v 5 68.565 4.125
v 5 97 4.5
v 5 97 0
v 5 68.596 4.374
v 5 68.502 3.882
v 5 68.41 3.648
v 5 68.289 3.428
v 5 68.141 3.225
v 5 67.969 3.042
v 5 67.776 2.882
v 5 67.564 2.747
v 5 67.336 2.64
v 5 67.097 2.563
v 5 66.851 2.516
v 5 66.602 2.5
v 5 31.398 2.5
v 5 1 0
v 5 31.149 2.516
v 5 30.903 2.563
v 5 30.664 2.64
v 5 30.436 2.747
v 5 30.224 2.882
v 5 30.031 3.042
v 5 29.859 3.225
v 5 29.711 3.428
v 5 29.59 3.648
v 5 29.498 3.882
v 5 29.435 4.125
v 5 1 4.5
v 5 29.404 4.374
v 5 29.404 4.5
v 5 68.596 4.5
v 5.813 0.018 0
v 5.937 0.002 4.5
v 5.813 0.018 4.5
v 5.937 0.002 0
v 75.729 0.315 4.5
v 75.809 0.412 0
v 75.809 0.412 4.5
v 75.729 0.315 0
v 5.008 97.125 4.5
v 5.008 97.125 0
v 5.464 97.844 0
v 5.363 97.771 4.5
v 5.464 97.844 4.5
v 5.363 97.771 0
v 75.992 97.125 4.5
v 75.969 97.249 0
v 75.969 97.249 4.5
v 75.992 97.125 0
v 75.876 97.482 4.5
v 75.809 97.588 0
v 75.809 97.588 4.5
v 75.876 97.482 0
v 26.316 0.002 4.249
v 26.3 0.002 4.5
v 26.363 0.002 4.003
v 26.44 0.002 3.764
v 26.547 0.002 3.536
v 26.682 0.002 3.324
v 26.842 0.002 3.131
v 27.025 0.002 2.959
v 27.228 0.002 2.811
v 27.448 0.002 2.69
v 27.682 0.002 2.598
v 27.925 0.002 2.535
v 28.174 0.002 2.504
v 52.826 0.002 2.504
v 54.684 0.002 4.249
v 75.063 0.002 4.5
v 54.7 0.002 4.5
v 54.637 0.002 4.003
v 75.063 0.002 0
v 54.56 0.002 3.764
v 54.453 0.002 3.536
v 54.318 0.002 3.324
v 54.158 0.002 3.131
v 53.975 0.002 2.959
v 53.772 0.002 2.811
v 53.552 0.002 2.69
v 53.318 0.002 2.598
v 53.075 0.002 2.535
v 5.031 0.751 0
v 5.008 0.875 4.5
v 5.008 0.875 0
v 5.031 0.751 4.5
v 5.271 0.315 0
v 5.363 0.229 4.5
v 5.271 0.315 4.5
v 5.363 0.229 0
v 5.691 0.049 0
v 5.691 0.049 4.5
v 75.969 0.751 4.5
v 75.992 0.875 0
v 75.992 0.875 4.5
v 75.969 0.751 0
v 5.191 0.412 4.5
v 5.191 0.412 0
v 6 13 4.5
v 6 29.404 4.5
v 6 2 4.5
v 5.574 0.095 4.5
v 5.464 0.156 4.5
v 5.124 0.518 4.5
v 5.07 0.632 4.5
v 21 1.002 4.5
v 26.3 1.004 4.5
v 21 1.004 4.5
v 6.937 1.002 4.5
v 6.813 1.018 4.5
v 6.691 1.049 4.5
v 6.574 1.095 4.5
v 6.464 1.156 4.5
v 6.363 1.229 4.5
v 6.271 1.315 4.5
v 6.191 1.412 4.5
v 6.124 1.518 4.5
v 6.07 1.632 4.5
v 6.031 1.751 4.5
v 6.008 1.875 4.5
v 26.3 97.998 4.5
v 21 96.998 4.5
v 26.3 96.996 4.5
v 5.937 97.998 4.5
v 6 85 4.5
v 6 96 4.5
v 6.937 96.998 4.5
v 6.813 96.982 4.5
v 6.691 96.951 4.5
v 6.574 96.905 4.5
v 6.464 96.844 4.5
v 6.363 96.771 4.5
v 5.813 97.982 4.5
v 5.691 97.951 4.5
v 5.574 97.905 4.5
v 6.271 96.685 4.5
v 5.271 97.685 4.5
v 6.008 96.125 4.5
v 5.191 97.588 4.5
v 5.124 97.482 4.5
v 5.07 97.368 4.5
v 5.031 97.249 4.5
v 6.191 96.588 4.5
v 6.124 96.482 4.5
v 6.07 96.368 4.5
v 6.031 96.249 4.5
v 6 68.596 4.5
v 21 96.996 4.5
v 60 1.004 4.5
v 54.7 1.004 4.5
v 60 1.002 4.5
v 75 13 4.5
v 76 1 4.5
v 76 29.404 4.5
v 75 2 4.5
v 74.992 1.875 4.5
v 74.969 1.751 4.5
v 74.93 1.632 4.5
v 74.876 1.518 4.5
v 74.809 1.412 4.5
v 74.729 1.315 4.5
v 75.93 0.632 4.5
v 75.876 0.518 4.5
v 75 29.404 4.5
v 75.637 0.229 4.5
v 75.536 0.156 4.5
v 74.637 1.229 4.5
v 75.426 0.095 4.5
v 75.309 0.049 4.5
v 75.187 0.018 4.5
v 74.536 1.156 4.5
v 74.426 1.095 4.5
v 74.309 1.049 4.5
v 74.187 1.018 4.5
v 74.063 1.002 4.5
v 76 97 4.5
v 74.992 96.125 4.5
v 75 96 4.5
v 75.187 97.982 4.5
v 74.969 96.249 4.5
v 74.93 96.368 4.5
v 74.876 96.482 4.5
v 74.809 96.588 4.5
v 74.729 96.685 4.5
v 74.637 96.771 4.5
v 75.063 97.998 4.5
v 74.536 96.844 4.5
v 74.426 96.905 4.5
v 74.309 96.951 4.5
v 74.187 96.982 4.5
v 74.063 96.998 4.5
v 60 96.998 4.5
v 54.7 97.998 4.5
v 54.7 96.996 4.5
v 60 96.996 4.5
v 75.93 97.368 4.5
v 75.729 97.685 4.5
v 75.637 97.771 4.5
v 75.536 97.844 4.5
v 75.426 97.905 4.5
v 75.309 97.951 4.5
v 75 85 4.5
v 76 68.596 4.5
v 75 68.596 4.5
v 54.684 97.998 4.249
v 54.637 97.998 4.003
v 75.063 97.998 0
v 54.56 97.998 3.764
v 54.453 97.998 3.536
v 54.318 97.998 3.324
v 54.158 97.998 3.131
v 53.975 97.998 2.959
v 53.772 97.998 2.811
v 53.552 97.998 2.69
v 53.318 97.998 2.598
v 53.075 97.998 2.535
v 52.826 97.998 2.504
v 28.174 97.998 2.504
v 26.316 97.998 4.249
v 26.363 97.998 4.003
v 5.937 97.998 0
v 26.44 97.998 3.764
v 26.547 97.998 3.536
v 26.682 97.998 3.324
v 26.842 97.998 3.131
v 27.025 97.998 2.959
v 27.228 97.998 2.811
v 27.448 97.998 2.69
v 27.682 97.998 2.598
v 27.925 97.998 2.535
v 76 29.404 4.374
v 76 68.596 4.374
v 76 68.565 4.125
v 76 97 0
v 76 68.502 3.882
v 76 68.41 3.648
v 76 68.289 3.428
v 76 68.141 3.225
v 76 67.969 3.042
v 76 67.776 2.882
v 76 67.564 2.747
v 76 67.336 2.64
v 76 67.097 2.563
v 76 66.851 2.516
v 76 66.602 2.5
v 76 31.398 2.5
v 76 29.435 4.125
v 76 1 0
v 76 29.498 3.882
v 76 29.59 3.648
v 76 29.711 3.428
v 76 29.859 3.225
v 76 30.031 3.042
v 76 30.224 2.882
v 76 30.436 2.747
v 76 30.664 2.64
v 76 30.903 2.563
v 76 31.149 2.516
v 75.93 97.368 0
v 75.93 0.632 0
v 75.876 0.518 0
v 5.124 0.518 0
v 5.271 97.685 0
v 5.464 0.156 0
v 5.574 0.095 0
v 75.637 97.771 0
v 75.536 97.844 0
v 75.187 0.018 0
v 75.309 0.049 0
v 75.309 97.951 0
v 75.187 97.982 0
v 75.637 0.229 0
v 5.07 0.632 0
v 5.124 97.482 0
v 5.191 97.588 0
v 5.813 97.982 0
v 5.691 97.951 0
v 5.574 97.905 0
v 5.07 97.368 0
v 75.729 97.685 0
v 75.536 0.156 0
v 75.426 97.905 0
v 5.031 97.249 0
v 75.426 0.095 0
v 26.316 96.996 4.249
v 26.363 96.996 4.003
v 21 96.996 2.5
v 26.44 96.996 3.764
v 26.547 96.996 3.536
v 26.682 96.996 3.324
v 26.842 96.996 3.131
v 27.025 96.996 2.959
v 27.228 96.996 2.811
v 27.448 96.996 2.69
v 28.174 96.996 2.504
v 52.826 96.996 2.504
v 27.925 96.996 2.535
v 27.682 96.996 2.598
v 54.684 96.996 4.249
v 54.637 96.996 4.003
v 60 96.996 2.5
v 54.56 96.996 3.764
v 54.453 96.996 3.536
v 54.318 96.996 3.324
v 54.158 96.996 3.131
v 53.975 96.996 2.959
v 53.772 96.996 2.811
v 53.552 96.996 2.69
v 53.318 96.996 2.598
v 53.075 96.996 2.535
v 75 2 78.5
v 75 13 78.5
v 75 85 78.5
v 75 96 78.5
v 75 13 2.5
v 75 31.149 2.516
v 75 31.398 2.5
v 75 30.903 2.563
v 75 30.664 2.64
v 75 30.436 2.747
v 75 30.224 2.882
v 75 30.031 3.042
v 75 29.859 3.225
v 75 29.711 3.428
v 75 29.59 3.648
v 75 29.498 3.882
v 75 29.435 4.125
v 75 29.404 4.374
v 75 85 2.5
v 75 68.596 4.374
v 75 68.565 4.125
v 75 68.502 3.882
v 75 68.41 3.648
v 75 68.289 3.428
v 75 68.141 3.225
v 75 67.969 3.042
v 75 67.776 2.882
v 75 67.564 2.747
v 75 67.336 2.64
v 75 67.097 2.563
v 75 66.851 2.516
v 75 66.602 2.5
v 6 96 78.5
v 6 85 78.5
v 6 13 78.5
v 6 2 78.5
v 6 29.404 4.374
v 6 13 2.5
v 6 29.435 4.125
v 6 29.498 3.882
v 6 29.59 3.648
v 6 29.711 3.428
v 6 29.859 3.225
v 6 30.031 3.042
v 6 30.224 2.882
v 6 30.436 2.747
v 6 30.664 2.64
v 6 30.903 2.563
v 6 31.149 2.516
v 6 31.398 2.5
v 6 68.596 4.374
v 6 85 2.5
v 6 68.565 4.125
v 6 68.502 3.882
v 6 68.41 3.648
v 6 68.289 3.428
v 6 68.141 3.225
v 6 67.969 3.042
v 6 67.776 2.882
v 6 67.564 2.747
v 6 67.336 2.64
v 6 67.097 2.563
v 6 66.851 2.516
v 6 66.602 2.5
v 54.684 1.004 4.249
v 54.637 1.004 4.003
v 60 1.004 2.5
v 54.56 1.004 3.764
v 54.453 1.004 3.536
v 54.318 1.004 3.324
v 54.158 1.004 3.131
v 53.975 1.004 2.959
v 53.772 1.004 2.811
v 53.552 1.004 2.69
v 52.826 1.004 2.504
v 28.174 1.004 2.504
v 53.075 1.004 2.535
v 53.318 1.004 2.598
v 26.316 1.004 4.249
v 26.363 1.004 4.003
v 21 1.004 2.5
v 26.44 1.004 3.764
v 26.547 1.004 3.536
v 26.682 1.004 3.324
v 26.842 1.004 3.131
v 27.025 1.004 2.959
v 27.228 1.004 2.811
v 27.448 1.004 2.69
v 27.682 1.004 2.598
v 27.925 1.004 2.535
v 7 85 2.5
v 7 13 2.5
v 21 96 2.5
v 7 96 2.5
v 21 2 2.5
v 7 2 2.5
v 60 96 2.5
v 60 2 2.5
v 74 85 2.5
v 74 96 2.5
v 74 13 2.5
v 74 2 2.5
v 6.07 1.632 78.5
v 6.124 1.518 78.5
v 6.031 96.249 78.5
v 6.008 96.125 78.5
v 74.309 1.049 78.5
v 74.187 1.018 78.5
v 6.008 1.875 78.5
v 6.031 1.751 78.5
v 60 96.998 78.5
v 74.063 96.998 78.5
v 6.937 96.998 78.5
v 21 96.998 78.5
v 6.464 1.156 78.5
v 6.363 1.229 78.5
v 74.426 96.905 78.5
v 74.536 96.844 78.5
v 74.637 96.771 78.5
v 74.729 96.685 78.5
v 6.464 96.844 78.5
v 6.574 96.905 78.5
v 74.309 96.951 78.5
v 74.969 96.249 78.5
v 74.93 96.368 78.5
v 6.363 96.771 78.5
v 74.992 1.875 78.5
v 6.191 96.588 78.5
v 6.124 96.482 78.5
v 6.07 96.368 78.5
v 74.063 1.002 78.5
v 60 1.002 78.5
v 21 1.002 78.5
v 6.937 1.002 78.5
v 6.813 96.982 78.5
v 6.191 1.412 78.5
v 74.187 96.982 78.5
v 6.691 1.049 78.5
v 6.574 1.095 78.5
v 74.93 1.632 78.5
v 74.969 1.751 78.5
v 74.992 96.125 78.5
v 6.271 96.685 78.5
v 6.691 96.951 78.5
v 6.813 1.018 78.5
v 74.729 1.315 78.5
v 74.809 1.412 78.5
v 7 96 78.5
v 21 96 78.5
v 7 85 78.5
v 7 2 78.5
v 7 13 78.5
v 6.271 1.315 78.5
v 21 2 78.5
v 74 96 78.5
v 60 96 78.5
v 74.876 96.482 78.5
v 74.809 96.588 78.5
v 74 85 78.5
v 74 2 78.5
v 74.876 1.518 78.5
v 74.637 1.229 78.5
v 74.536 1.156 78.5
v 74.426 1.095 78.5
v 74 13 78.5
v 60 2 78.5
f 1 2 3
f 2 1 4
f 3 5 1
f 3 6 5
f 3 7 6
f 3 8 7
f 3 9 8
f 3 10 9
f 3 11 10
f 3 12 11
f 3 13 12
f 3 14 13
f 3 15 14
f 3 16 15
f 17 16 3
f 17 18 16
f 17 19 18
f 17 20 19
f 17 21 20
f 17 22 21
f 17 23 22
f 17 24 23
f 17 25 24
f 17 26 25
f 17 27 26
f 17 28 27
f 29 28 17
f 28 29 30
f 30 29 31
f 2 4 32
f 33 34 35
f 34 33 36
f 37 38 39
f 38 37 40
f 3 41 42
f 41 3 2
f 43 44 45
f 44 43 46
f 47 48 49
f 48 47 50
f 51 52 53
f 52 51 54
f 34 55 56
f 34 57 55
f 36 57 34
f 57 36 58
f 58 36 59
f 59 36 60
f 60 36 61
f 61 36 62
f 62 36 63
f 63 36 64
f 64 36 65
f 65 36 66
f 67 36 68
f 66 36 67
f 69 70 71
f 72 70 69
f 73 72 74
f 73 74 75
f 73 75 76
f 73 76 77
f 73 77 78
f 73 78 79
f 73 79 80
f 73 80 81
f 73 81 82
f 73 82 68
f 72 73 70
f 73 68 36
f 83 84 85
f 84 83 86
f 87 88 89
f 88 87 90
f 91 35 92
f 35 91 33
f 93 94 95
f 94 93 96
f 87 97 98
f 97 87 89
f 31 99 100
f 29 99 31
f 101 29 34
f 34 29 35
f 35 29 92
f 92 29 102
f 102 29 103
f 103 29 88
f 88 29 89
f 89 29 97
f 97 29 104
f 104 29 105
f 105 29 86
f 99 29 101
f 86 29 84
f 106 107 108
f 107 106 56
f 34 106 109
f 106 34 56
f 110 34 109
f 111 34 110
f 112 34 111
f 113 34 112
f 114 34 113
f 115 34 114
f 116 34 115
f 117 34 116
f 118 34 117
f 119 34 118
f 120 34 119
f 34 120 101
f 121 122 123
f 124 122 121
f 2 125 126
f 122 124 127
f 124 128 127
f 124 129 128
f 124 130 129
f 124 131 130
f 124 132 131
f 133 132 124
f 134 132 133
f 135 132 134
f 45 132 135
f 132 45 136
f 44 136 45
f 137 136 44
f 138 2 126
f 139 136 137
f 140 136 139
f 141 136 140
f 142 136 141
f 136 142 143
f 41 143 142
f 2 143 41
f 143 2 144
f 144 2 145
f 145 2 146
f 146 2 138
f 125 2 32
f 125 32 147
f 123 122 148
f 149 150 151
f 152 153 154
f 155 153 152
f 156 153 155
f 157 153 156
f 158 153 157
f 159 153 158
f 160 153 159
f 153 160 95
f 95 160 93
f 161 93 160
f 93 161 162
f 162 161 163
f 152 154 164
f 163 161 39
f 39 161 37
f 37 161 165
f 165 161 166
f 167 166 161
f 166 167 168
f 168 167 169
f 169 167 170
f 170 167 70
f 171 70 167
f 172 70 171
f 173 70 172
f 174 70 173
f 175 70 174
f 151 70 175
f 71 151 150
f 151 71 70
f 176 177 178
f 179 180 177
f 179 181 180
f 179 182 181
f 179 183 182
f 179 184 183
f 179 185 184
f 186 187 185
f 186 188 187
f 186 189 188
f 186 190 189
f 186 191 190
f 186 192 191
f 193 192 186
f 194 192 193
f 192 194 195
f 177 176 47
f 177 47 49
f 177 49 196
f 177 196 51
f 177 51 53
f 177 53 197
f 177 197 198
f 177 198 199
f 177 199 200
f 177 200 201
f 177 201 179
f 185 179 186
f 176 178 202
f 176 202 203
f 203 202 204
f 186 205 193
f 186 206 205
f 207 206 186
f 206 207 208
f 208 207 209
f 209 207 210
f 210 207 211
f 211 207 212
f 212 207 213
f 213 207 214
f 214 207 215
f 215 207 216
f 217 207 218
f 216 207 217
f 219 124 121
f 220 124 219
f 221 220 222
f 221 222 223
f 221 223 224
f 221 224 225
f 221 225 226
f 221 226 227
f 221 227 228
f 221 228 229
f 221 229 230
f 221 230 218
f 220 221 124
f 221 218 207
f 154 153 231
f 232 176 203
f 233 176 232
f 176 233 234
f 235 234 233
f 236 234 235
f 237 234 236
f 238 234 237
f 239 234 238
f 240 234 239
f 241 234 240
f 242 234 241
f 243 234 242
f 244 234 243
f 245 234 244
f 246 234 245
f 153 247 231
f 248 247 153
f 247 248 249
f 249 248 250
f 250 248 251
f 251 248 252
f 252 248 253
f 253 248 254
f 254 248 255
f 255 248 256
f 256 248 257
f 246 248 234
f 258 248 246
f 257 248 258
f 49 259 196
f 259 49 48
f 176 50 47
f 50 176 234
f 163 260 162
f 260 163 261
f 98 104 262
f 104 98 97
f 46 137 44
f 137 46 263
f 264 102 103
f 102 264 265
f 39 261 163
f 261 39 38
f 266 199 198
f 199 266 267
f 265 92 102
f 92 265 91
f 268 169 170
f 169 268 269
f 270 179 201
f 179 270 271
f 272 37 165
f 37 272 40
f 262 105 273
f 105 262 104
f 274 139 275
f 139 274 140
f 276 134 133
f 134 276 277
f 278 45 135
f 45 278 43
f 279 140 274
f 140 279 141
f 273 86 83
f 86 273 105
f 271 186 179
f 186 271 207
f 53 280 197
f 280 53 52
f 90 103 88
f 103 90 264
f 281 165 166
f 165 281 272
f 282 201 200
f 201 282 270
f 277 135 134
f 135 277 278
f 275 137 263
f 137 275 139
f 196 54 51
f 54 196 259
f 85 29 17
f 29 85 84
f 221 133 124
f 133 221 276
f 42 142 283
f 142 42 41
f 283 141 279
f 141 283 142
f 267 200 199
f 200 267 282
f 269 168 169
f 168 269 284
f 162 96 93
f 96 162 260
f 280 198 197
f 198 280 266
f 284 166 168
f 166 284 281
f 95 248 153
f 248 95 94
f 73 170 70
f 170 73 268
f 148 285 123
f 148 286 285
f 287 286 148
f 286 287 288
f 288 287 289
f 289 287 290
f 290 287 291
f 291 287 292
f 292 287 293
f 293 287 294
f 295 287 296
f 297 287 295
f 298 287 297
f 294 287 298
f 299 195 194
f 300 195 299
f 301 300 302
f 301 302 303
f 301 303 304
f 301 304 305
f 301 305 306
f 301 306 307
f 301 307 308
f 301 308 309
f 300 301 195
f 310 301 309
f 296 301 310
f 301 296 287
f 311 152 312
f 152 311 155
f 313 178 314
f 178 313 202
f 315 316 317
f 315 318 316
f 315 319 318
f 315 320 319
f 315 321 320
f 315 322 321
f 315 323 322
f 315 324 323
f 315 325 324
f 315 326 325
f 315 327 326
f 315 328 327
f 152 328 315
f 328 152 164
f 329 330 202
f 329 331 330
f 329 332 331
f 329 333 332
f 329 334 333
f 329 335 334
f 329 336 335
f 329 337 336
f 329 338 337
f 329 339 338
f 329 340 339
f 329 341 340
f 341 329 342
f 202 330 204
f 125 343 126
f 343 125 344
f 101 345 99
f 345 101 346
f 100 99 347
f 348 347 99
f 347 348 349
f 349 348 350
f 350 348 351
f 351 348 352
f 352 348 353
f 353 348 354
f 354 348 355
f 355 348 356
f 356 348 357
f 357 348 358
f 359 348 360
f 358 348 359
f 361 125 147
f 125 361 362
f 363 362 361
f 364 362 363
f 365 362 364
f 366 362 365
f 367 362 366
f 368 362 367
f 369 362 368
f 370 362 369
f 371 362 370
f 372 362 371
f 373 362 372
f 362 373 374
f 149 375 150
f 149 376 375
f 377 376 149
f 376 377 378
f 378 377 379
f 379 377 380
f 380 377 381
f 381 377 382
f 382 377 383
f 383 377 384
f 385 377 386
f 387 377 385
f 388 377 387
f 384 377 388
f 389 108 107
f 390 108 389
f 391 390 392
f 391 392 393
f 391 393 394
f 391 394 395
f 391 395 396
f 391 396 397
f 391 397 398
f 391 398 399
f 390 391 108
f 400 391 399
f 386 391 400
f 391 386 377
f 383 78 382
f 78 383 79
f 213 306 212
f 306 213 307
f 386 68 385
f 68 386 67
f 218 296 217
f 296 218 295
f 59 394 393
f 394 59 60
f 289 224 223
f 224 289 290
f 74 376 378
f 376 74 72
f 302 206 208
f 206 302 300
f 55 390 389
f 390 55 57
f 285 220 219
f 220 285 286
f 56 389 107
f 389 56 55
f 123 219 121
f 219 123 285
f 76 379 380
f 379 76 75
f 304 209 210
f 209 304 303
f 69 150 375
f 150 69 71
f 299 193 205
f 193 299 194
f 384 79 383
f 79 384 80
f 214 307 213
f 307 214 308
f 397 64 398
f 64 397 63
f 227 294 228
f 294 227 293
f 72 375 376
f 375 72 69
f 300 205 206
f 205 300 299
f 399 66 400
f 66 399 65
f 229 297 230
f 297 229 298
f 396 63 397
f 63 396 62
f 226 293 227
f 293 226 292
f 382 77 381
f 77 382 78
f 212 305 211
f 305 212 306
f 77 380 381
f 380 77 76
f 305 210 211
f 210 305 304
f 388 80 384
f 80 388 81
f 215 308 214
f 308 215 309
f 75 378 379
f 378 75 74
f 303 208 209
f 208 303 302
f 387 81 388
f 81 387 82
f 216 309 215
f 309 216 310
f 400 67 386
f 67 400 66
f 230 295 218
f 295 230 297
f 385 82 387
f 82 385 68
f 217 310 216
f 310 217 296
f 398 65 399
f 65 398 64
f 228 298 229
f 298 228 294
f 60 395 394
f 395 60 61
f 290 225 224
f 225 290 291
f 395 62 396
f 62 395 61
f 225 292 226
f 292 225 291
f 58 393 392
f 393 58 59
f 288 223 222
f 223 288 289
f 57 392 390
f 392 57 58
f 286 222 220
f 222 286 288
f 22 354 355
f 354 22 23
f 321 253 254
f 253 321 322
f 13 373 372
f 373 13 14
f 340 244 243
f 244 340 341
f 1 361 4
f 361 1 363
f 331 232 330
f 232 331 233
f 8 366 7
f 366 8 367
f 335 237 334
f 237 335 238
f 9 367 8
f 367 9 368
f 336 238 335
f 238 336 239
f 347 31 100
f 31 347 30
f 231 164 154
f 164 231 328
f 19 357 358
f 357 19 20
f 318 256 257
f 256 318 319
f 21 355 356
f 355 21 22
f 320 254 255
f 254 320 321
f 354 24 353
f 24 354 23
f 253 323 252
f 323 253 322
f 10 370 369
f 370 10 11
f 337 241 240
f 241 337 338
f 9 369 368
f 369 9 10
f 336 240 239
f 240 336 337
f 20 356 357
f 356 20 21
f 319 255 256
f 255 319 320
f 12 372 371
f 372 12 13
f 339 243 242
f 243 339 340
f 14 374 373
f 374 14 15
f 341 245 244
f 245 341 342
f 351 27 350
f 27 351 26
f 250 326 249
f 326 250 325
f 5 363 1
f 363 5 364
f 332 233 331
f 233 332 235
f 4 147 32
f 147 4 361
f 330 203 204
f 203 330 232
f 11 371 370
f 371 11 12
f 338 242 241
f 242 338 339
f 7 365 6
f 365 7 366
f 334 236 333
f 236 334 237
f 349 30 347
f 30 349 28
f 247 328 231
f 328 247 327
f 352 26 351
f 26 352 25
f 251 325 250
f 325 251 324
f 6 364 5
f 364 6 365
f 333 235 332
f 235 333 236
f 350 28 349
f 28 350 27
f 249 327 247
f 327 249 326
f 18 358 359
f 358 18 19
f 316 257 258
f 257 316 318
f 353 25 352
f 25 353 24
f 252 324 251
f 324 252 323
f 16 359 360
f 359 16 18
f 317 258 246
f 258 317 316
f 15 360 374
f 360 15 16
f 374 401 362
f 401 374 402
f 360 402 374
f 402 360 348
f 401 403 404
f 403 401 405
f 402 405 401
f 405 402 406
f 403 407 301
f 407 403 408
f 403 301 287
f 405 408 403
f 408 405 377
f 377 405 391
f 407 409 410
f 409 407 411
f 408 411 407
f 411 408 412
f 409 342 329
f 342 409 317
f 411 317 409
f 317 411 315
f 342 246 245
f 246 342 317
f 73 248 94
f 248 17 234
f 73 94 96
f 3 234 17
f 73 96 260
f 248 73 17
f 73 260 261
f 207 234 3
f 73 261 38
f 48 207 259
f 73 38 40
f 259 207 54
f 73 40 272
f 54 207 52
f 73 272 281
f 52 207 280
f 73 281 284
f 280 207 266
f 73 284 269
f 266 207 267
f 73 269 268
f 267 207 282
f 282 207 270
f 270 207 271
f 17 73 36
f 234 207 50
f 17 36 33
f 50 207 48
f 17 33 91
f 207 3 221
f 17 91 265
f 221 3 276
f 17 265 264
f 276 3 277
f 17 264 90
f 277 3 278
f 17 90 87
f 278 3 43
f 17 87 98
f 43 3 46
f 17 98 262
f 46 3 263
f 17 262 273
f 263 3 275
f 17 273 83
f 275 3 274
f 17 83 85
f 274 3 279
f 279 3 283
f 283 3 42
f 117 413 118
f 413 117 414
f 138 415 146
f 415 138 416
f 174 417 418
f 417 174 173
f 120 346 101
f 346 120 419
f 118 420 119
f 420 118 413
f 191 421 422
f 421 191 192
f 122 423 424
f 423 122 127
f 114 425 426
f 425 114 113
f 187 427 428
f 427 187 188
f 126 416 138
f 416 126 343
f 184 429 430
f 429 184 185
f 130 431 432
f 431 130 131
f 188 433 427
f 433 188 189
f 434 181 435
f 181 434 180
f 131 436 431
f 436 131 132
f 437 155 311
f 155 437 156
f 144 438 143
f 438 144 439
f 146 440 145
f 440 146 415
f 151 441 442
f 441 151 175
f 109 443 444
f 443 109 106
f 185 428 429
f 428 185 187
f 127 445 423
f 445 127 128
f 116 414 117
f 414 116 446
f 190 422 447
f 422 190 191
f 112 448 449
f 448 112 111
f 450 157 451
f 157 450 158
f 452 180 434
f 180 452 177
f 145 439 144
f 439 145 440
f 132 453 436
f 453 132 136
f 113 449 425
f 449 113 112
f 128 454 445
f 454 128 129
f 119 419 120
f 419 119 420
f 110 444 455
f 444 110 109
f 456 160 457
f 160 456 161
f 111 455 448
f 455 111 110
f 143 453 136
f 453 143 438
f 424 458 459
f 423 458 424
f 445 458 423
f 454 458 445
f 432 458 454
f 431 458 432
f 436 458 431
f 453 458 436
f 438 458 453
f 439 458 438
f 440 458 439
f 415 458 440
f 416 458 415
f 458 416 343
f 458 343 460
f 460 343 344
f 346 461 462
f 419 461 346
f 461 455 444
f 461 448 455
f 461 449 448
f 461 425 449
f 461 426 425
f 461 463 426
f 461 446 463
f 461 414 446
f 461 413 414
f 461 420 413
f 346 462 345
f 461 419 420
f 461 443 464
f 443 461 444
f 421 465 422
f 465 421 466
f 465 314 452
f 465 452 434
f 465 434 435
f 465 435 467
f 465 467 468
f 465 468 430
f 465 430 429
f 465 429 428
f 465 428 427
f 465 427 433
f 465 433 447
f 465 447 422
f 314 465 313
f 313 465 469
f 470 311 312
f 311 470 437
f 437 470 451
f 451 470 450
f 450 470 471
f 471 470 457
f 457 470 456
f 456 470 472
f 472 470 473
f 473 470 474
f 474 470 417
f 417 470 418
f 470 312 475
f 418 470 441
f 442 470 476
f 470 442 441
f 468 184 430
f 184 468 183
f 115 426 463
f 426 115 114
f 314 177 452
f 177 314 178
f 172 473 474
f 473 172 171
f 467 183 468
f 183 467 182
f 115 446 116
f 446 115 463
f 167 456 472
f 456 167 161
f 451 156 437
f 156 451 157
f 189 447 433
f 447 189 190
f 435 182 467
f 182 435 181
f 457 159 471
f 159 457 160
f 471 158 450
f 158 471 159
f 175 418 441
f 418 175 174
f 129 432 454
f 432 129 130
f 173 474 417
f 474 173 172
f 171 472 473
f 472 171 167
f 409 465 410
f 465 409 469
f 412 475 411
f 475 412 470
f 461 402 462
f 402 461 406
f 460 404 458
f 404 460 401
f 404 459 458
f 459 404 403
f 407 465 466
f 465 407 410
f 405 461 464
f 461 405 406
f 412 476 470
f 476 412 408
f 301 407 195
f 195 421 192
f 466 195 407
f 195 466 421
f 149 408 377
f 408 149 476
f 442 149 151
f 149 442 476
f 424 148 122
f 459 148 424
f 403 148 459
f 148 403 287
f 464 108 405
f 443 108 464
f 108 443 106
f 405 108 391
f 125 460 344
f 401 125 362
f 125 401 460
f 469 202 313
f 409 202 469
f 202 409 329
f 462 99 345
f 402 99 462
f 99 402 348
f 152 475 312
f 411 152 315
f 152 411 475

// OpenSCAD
$fn=50; 



module rcube ( d , r=1 , c="" ) {
	R = 2*r;
	if( c == "" ) {
		if( d.x<=R || d.y<=R || d.z<=R )
			assert(false, "r to big for rcube!");
		minkowski(){ translate([r,r,r])
			cube([ d.x-R , d.y-R , d.z-R ]); sphere(r); }
	} else if( c == "xy" ) {
		if( d.x<=R || d.y<=R )
			assert(false, "r to big for rcube!");
		minkowski(){ translate([r,r,0])
			cube([ d.x-R , d.y-R , d.z ]); cylinder(r=r,h=0.0001); }
	} else if( c == "yz" ) {
		if( d.y<=R || d.z<=R )
			assert(false, "r to big for rcube!");
		minkowski(){ translate([0,r,r])
			cube([ d.x , d.y-R , d.z-R ]); rotate([0,90,0]) cylinder(r=r,h=0.0001); }
	} else if( c == "xz" ) {
		if( d.x<=R || d.z<=R )
			assert(false, "r to big for rcube!");
		minkowski(){ translate([r,0,r])
			cube([ d.x-R , d.y , d.z-R ]); rotate([90,0,0]) cylinder(r=r,h=0.0001); }
	} else
		assert(false, "Wrong coordinates for rcube!"); }



module base_plate ( d , w , f1 , f2 ) {
	rcube([ d.x , d.y , f1 ] , c="xy" );
	difference(){
		translate([0,0,f1]) 			rcube([ d.x , d.y , f2 ] , 			 		c="xy" );
		translate([w,w,f1]) 			rcube([ d.x-2*w , d.y-2*w , 2*f2 ] ,r=f2 , c="xy" );
		translate([0.3*d.x,0,f1]) rcube([ 0.4*d.x , d.y , 2*d.z ] ,	 	r=f2 , c="xz" );
		translate([0,0.3*d.y,f1]) rcube([ d.x , 0.4*d.y , 2*d.z ] ,	 	r=f2 , c="yz" ); } }



module nops ( d , w , f1 , f2 ) {
	translate([ 0,0,d.z+w-(8-f1-f2) ]) union(){
		translate([ w , w+6 , 0 ]) 				scale([0.25,1,1])rotate([0,90,0])sphere(2.5);
		translate([ d.x-w , w+6 , 0 ]) 		scale([0.25,1,1])rotate([0,90,0])sphere(2.5);
		translate([ d.x-w , d.y-(w+6) , 0 ])scale([0.25,1,1])rotate([0,90,0])sphere(2.5);
		translate([ w , d.y-(w+6) , 0 ]) 		scale([0.25,1,1])rotate([0,90,0])sphere(2.5); } }



module nop_holes ( d , w , f1 , f2 ) {
	translate([ w , w+6 , 8 ]) 					scale([0.25,1,1])rotate([0,90,0])sphere(2.5);
	translate([ d.x-w , w+6 , 8 ]) 			scale([0.25,1,1])rotate([0,90,0])sphere(2.5);
	translate([ d.x-w , d.y-(w+6) , 8 ])scale([0.25,1,1])rotate([0,90,0])sphere(2.5);
	translate([ w , d.y-(w+6) , 8 ]) 		scale([0.25,1,1])rotate([0,90,0])sphere(2.5); }



// =========================================================================================== //



module card_holder ( d , w , f1 , f2 ) {
	difference(){
		union(){
			base_plate( d , w , f1 , f2 );
			// HOLDER
			difference(){
				translate([w,w,f1]) 			rcube([ d.x-2*w , d.y-2*w , d.z ] , c="xy" );
				translate([2*w,2*w,f1])		cube([ d.x-4*w , d.y-4*w , 2*d.z ]);
				translate([w+15,w,f1])	cube([ d.x-2*w-30 , d.y-2*w , 2*d.z ]);
				translate([w,w+12,f1])	cube([ d.x-2*w , d.y-2*w-24 , 2*d.z ]); } }
	//nop_holes( d , w , f1 , f2 ); 
				} }



module card_holder_topper ( d , w , f1 , f2 ) { 
	// PLATE
	difference(){
		rcube([ d.x , d.y , w ] , c="xy" );
		#translate([5*w,5*w,0]) rcube([ d.x-10*w , d.y-10*w , w ] , c="xy" ); }
	// WALL
	difference(){
		translate([0,0,w]) rcube([ d.x , d.y , d.z ] , c="xy");
		translate([w,w,w]) rcube([ d.x-2*w , d.y-2*w , d.z ] , c="xy");
		translate([0.3*d.x,0,d.z+w-f2]) rcube([0.4*d.x,d.y,2*d.z] , c="xz");
		translate([0,0.3*d.y,d.z+w-f2]) rcube([d.x,0.4*d.y,2*d.z] , c="yz"); }
	//nops( d , w , f1 , f2 ); 
		}



module token_holder ( d , w , f1 , f2 ) {
	difference(){
		union(){
			base_plate( d , w , f1 , f2 );
			difference(){
				translate([w,w,f1]) rcube([d.x-2*w,d.y-2*w,d.z] , c="xy" );
				translate([2*w,2*w,f1]) rcube([d.x-4*w,d.y-4*w,2*d.z] , r=3 , c="" ); } }
		//nop_holes( d , w , f1 , f2 ); 
				} }



module token_holder_topper ( d , w , f1 , f2 ) {
	// GRID
	difference(){
		rcube([ d.x , d.y , w ] , c="xy" );
		for ( i = [0:1:3]) {
			for ( j = [0:1:6]) {
				translate([ 3.5+i+5*i , 4.5+j+5*j , 0 ]) rcube([ 5 , 5 , w ] , c="xy" ); } } }
	// WALL
	difference(){
		translate([ 0 , 0 , w ]) rcube([ d.x , d.y , d.z ] , c="xy" );
		translate([ w , w , w ]) rcube([ d.x-2*w , d.y-2*w , d.z ] , c="xy" );
		translate([ 0.3*d.x , 0 , d.z+w-f2 ]) rcube([ 0.4*d.x , d.y , 2*d.z ] , c="xz" );
		translate([ 0 , 0.3*d.y , d.z+w-f2 ]) rcube([ d.x , 0.4*d.y , 2*d.z ] , c="yz" ); }
	//nops( d , w , f1 , f2 );
}


// Höhe 76 + 2.5 = 78.5
translate([5,0,0])   card_holder( d=[ 71 , 98 , 76 ] , w=1 , f1=2.5 , f2=2.0 );

//translate([-75,0,0]) card_holder_topper( d=[ 71 , 98 , 76 ] , w=1 , f1=2.5 , f2=2.0 );



// BEDENKE: 4 mm walls und 2 mm margin
